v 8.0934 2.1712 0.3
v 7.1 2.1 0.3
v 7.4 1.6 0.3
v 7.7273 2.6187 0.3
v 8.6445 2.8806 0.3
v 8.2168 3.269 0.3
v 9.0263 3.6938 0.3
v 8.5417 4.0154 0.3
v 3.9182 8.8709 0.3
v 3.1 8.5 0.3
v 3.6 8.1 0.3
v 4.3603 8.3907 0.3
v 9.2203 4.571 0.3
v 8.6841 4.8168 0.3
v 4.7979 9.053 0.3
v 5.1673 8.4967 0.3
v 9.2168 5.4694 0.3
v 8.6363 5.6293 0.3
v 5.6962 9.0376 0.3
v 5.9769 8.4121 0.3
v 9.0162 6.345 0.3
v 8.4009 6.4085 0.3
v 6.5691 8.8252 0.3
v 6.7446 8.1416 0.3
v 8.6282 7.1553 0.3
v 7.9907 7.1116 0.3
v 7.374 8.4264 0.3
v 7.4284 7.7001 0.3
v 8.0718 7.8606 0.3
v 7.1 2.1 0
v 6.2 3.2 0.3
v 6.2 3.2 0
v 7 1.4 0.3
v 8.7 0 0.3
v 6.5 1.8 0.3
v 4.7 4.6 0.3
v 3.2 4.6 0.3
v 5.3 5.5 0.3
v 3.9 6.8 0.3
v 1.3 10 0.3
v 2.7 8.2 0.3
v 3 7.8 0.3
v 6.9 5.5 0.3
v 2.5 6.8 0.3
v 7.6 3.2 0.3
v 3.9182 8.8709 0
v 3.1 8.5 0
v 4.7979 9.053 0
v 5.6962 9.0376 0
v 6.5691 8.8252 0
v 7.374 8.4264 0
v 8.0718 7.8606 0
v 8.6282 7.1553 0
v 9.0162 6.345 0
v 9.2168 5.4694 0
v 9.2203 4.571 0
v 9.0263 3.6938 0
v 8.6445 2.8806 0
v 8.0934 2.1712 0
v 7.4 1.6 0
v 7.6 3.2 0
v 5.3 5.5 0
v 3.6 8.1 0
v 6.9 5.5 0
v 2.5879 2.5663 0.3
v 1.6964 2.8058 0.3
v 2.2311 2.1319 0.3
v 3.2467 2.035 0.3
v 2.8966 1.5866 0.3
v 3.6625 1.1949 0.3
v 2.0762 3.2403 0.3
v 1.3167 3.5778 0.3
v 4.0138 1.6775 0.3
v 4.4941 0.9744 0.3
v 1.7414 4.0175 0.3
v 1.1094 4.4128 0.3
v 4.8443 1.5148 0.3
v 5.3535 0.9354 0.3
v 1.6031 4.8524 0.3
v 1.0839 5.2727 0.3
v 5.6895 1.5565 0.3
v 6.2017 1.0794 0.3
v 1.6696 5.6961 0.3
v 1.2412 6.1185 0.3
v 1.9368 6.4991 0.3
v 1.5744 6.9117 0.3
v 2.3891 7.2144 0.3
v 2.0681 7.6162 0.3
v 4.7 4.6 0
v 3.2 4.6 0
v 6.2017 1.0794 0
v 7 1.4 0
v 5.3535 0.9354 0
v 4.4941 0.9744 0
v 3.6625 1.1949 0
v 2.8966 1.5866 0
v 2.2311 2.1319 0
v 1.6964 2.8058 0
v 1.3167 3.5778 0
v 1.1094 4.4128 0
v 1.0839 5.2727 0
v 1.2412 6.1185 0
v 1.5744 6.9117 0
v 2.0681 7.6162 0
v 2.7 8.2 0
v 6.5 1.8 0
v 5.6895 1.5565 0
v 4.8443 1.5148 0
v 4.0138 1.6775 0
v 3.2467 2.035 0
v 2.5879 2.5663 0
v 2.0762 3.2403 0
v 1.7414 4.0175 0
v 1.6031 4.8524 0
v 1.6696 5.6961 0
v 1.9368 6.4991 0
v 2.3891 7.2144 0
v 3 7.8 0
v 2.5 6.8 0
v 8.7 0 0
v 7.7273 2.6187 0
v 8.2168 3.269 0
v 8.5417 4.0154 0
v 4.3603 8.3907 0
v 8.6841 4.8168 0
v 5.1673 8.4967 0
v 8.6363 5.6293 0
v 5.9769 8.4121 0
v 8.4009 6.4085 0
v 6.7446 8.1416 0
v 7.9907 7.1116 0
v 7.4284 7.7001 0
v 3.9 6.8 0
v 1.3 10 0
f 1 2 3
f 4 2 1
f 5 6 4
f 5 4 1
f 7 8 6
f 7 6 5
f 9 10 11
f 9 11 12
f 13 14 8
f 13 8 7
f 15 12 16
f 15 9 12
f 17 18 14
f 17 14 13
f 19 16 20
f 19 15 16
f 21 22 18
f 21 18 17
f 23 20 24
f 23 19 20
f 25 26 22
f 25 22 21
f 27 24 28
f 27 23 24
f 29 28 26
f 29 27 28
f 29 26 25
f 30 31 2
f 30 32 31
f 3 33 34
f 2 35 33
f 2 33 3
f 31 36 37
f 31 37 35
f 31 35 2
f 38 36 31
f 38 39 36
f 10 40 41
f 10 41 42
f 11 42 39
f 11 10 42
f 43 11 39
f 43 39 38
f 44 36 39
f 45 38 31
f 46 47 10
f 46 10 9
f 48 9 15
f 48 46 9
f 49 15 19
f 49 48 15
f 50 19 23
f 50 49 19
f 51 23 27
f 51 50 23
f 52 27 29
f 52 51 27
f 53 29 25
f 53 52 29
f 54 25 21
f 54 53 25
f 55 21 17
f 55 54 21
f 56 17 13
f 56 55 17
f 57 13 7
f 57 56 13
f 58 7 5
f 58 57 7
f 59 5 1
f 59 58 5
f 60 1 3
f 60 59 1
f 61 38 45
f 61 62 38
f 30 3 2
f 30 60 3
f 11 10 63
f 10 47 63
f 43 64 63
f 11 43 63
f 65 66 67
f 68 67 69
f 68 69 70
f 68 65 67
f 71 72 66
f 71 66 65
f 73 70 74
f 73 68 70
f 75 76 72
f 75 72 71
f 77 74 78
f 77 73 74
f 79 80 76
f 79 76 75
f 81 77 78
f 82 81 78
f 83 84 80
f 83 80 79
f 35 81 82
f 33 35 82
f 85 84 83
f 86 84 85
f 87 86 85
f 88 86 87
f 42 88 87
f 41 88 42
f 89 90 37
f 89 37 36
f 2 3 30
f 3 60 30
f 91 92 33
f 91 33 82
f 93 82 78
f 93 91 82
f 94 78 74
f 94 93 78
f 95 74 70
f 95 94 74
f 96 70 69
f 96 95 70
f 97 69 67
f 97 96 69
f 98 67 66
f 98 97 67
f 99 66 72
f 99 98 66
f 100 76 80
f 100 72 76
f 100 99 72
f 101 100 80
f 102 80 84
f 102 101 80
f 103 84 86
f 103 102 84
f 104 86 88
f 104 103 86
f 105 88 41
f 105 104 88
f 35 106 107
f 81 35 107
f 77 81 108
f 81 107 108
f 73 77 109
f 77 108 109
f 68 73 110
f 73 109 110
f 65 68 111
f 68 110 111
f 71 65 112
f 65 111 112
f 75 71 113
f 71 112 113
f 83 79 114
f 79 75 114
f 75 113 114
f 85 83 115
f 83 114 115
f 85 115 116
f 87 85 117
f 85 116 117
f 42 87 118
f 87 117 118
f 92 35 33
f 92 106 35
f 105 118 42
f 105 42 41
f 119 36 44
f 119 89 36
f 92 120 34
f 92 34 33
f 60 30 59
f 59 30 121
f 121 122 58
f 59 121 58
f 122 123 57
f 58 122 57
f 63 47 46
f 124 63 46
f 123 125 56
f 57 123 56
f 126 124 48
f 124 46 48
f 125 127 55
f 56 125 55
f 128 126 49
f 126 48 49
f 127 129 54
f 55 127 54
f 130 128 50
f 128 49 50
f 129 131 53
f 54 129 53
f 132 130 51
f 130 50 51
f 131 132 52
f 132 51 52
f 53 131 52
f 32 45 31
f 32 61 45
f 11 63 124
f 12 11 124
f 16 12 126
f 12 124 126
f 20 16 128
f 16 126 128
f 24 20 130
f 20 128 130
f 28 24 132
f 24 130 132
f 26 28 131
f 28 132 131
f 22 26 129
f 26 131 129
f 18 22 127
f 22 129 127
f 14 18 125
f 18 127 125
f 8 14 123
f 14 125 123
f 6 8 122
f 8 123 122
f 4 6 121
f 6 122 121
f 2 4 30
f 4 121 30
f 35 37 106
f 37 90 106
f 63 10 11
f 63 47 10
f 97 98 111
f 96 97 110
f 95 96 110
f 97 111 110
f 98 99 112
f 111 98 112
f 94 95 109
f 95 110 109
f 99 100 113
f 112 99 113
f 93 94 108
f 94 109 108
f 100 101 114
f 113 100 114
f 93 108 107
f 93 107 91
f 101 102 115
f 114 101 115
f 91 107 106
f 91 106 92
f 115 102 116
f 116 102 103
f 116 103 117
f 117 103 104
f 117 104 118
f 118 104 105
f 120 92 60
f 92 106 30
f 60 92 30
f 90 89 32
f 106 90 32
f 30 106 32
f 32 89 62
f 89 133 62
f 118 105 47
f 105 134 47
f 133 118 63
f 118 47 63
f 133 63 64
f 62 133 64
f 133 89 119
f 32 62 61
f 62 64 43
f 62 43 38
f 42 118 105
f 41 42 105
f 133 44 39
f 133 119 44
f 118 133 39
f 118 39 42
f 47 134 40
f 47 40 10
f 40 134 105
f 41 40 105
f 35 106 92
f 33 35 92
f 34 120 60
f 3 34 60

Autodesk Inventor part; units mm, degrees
ref_plane "Work Plane1" through (0, 0, 0) normal (0, 0, 1) x (1, 0, 0)
sketch "Sketch1" plane through (0, 0, 0) normal (0, 0, 1) x (1, 0, 0)
  line L0 (1.3, 10) -> (3.1, 8.5)
  line L1 (3.1, 8.5) -> (3.6, 8.1)
  line L2 (6.9, 5.5) -> (3.6, 8.1)
  line L3 (6.9, 5.5) -> (5.3, 5.5)
  line L4 (5.3, 5.5) -> (7.6, 3.2)
  line L5 (7.6, 3.2) -> (6.2, 3.2)
  line L6 (6.2, 3.2) -> (7.1, 2.1)
  line L7 (7.4, 1.6) -> (7.1, 2.1)
  line L8 (8.7, 0) -> (7.4, 1.6)
  line L9 (8.7, 0) -> (7, 1.4)
  line L10 (6.5, 1.8) -> (7, 1.4)
  line L11 (3.2, 4.6) -> (6.5, 1.8)
  line L12 (3.2, 4.6) -> (4.7, 4.6)
  line L13 (4.7, 4.6) -> (2.5, 6.8)
  line L14 (2.5, 6.8) -> (3.9, 6.8)
  line L15 (3.9, 6.8) -> (3, 7.8)
  line L16 (3, 7.8) -> (2.7, 8.2)
  line L17 (1.3, 10) -> (2.7, 8.2)
extrude "Extrusion1" add sketch "Sketch1" along normal blind 0.3
ref_plane "Work Plane2" through (0, 0, 0) normal (0, 0, 1) x (1, 0, 0)
sketch "Sketch2" plane through (0, 0, 0) normal (0, 0, 1) x (1, 0, 0)
  line L0 (6.5, 1.8) -> (7, 1.4)
  arc A0 (2.7, 8.2) -> (7, 1.4) centre (5.106, 4.9619) ccw
  line L1 (3, 7.8) -> (2.7, 8.2)
  arc A1 (3, 7.8) -> (6.5, 1.8) centre (5.096, 5.0019) ccw
extrude "Extrusion2" add sketch "Sketch2" along normal blind 0.3 separate body
ref_plane "Work Plane3" through (0, 0, 0) normal (0, 0, 1) x (1, 0, 0)
sketch "Sketch3" plane through (0, 0, 0) normal (0, 0, 1) x (1, 0, 0)
  line L0 (3.1, 8.5) -> (3.6, 8.1)
  arc A0 (7.1, 2.1) -> (3.6, 8.1) centre (5.2133, 5.0203) ccw
  line L1 (7.4, 1.6) -> (7.1, 2.1)
  arc A1 (7.4, 1.6) -> (3.1, 8.5) centre (5.1775, 5.0048) ccw
extrude "Extrusion3" add sketch "Sketch3" along normal blind 0.3 separate body
properties part number "test_flash_cad_model"
